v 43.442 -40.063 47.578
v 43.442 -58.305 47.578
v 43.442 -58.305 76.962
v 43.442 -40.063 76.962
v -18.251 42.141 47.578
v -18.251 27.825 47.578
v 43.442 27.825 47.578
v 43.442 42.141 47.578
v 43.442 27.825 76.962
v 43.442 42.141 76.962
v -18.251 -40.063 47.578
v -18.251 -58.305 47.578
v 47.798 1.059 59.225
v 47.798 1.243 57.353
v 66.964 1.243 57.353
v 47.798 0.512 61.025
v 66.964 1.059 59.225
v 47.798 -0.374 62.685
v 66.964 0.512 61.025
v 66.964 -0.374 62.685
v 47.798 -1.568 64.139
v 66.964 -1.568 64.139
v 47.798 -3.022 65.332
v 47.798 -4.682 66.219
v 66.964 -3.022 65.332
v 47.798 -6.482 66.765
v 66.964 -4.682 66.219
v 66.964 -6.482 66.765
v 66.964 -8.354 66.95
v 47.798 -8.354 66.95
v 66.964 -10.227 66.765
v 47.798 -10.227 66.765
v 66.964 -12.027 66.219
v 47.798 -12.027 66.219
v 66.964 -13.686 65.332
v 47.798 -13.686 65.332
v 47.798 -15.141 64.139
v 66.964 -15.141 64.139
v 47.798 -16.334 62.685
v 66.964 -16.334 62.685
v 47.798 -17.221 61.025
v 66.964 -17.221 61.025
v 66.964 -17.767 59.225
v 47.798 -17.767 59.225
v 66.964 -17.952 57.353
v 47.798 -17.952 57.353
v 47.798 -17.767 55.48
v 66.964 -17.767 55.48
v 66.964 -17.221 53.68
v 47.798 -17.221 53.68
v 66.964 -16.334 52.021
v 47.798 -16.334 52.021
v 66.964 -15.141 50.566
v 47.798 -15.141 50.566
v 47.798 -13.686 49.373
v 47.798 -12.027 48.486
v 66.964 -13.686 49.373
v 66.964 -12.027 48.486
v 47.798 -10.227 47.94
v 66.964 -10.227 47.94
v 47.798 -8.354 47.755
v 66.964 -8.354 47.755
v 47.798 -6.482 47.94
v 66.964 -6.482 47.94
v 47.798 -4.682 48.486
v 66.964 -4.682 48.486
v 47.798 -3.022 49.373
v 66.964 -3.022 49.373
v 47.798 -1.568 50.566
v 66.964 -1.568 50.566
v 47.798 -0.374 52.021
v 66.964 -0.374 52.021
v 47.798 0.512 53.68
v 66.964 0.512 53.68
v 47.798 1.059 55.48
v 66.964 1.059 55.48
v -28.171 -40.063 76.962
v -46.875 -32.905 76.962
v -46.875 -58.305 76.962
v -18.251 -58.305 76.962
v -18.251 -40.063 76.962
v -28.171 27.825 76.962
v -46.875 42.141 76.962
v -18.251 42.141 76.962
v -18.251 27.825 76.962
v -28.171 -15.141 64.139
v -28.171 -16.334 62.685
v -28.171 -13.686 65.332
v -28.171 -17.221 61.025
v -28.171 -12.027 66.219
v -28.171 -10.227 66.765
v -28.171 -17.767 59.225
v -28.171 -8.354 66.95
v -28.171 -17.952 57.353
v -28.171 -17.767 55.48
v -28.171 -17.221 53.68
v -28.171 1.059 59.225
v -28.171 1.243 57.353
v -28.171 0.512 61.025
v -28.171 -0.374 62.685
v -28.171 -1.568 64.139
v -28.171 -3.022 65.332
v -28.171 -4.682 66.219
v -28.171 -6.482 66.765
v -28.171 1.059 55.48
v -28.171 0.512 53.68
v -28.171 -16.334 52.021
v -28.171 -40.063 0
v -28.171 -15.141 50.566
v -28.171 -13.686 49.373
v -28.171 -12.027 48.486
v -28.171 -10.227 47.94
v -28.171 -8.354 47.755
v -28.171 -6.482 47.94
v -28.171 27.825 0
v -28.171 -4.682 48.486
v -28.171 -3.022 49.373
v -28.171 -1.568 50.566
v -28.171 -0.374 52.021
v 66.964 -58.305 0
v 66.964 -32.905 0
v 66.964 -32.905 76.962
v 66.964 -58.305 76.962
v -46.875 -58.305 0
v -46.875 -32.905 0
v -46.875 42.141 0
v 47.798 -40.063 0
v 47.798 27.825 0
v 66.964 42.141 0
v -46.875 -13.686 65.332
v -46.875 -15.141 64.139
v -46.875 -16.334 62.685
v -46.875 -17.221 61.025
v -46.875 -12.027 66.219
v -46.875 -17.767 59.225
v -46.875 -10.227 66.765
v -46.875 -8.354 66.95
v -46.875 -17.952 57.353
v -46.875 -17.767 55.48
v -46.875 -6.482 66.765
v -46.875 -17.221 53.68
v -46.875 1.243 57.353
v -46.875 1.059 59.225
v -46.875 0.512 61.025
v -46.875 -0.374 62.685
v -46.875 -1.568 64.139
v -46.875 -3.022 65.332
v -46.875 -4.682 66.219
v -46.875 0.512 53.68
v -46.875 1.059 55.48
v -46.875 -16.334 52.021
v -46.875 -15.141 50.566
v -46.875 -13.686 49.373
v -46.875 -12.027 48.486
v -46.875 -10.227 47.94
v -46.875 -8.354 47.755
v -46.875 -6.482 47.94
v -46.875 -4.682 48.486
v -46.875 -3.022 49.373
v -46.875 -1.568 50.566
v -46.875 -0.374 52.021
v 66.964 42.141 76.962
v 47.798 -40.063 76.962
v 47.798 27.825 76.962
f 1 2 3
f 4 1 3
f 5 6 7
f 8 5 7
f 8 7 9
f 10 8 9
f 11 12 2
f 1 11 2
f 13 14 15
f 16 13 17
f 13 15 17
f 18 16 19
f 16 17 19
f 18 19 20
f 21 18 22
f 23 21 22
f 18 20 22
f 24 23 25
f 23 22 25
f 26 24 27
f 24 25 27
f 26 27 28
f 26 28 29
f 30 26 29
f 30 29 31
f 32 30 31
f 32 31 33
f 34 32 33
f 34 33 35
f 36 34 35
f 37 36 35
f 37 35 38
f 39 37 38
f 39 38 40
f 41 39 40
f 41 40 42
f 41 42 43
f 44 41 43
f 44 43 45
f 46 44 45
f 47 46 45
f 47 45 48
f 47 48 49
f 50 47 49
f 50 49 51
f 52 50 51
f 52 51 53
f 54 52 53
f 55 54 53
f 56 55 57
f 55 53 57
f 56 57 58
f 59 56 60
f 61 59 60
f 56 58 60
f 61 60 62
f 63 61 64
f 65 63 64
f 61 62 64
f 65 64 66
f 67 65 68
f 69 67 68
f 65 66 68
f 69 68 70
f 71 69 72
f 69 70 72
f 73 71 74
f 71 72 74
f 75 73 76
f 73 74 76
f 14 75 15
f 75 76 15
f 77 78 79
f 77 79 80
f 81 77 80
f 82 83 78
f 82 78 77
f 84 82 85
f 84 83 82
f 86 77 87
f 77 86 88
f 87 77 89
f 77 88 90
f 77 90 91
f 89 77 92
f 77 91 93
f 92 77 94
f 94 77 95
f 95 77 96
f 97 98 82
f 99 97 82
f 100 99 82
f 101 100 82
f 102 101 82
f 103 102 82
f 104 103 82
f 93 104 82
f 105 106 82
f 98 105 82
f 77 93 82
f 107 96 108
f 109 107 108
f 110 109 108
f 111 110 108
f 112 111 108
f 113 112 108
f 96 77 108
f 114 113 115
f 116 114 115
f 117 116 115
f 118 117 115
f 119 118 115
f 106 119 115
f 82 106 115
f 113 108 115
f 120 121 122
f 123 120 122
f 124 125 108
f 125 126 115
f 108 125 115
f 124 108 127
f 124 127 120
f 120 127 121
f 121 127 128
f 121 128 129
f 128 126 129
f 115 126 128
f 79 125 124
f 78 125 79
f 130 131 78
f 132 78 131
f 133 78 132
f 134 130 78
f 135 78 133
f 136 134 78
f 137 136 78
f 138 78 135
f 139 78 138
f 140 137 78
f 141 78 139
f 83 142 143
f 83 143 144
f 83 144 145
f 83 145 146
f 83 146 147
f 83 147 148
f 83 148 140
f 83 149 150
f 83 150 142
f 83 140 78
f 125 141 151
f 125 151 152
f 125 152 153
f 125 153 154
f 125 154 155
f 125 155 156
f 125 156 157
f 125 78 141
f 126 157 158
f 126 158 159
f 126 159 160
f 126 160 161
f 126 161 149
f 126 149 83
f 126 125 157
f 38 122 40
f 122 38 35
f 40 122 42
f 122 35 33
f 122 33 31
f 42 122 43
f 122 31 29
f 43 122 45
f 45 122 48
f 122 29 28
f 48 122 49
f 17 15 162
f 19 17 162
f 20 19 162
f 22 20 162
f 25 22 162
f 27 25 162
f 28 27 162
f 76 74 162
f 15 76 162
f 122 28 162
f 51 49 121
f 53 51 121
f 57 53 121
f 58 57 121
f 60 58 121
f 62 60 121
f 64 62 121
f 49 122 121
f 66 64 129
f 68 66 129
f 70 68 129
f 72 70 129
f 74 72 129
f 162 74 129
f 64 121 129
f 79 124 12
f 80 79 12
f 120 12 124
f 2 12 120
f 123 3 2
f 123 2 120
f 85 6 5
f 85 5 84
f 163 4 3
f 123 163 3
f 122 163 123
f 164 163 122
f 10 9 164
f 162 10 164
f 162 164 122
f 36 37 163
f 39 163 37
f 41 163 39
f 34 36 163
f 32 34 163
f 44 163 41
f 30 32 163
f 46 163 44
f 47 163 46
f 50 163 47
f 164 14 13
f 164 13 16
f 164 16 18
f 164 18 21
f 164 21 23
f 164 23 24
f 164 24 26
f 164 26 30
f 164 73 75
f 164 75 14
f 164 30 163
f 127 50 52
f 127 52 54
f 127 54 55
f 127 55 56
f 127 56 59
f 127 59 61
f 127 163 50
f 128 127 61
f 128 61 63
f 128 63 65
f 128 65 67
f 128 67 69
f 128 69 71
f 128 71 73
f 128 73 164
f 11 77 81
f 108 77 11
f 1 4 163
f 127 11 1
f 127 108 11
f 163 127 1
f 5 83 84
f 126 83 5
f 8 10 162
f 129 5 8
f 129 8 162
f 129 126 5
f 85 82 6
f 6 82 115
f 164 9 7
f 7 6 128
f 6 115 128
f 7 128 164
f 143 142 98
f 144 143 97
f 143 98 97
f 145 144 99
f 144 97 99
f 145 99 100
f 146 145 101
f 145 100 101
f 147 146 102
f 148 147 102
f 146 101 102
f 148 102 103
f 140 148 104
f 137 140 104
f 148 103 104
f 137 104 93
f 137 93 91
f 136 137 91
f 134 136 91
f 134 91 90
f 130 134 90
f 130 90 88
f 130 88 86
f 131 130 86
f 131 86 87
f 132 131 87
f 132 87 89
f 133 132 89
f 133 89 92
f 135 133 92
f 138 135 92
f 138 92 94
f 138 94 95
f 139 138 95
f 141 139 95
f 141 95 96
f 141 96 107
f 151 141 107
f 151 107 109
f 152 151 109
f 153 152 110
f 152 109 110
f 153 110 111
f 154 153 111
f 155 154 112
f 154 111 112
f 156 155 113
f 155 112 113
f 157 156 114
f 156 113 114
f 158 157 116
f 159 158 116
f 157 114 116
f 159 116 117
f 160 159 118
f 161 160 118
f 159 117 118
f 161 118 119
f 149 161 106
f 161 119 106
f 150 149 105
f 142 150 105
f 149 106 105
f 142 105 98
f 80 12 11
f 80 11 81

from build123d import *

# Parameters (mm, degrees)
F0_W      = 113.838189
F0_H      = 75.045459
F0_W_2    = 75.969089
F0_H_2    = 47.567274
F1_DEPTH  = 76.962
F1_FACE_W = 113.838188
F1_FACE_H = 76.962
F2_DEPTH  = 25.4
F3_W      = 61.692573
F3_H      = 29.383676
F4_DEPTH  = 132.842
F5_W      = 75.969089
F5_H      = 67.656364
F6_DEPTH  = 129.032
F7_R      = 9.597279
F8_DEPTH  = 241.808


with BuildPart() as f1:
    # F0 (on Top) → F1 (new body)
    with BuildSketch(Plane.XY):
        with Locations((10.044548, 4.618182)):
            Rectangle(F0_W, F0_H)
        with Locations((9.813634, 4.04091)):
            Rectangle(F0_W_2, F0_H_2, mode=Mode.SUBTRACT)
    extrude(amount=F1_DEPTH)

    # F1_face (on face) → F2 (join)
    with BuildSketch(Plane(origin=(10.044549, -32.904547, 38.481), x_dir=(1, 0, 0), z_dir=(0, -1, 0))):
        Rectangle(F1_FACE_W, F1_FACE_H)
    extrude(amount=F2_DEPTH)

    # F3 (on face) → F4 (cut)
    with BuildSketch(Plane.XZ.offset(58.304547)):
        with Locations((12.595225, 62.270162)):
            Rectangle(F3_W, F3_H)
    extrude(amount=-F4_DEPTH, mode=Mode.SUBTRACT)

    # F5 (on Top) → F6 (cut)
    with BuildSketch(Plane.XY):
        with Locations((9.813634, -6.234547)):
            Rectangle(F5_W, F5_H)
    extrude(amount=F6_DEPTH, mode=Mode.SUBTRACT)

    # F7 (on face) → F8 (cut)
    with BuildSketch(Plane.YZ.offset(66.963643)):
        with Locations((-8.354291, 57.352625)):
            Circle(F7_R)
    extrude(amount=-F8_DEPTH, mode=Mode.SUBTRACT)


solid = f1.part
